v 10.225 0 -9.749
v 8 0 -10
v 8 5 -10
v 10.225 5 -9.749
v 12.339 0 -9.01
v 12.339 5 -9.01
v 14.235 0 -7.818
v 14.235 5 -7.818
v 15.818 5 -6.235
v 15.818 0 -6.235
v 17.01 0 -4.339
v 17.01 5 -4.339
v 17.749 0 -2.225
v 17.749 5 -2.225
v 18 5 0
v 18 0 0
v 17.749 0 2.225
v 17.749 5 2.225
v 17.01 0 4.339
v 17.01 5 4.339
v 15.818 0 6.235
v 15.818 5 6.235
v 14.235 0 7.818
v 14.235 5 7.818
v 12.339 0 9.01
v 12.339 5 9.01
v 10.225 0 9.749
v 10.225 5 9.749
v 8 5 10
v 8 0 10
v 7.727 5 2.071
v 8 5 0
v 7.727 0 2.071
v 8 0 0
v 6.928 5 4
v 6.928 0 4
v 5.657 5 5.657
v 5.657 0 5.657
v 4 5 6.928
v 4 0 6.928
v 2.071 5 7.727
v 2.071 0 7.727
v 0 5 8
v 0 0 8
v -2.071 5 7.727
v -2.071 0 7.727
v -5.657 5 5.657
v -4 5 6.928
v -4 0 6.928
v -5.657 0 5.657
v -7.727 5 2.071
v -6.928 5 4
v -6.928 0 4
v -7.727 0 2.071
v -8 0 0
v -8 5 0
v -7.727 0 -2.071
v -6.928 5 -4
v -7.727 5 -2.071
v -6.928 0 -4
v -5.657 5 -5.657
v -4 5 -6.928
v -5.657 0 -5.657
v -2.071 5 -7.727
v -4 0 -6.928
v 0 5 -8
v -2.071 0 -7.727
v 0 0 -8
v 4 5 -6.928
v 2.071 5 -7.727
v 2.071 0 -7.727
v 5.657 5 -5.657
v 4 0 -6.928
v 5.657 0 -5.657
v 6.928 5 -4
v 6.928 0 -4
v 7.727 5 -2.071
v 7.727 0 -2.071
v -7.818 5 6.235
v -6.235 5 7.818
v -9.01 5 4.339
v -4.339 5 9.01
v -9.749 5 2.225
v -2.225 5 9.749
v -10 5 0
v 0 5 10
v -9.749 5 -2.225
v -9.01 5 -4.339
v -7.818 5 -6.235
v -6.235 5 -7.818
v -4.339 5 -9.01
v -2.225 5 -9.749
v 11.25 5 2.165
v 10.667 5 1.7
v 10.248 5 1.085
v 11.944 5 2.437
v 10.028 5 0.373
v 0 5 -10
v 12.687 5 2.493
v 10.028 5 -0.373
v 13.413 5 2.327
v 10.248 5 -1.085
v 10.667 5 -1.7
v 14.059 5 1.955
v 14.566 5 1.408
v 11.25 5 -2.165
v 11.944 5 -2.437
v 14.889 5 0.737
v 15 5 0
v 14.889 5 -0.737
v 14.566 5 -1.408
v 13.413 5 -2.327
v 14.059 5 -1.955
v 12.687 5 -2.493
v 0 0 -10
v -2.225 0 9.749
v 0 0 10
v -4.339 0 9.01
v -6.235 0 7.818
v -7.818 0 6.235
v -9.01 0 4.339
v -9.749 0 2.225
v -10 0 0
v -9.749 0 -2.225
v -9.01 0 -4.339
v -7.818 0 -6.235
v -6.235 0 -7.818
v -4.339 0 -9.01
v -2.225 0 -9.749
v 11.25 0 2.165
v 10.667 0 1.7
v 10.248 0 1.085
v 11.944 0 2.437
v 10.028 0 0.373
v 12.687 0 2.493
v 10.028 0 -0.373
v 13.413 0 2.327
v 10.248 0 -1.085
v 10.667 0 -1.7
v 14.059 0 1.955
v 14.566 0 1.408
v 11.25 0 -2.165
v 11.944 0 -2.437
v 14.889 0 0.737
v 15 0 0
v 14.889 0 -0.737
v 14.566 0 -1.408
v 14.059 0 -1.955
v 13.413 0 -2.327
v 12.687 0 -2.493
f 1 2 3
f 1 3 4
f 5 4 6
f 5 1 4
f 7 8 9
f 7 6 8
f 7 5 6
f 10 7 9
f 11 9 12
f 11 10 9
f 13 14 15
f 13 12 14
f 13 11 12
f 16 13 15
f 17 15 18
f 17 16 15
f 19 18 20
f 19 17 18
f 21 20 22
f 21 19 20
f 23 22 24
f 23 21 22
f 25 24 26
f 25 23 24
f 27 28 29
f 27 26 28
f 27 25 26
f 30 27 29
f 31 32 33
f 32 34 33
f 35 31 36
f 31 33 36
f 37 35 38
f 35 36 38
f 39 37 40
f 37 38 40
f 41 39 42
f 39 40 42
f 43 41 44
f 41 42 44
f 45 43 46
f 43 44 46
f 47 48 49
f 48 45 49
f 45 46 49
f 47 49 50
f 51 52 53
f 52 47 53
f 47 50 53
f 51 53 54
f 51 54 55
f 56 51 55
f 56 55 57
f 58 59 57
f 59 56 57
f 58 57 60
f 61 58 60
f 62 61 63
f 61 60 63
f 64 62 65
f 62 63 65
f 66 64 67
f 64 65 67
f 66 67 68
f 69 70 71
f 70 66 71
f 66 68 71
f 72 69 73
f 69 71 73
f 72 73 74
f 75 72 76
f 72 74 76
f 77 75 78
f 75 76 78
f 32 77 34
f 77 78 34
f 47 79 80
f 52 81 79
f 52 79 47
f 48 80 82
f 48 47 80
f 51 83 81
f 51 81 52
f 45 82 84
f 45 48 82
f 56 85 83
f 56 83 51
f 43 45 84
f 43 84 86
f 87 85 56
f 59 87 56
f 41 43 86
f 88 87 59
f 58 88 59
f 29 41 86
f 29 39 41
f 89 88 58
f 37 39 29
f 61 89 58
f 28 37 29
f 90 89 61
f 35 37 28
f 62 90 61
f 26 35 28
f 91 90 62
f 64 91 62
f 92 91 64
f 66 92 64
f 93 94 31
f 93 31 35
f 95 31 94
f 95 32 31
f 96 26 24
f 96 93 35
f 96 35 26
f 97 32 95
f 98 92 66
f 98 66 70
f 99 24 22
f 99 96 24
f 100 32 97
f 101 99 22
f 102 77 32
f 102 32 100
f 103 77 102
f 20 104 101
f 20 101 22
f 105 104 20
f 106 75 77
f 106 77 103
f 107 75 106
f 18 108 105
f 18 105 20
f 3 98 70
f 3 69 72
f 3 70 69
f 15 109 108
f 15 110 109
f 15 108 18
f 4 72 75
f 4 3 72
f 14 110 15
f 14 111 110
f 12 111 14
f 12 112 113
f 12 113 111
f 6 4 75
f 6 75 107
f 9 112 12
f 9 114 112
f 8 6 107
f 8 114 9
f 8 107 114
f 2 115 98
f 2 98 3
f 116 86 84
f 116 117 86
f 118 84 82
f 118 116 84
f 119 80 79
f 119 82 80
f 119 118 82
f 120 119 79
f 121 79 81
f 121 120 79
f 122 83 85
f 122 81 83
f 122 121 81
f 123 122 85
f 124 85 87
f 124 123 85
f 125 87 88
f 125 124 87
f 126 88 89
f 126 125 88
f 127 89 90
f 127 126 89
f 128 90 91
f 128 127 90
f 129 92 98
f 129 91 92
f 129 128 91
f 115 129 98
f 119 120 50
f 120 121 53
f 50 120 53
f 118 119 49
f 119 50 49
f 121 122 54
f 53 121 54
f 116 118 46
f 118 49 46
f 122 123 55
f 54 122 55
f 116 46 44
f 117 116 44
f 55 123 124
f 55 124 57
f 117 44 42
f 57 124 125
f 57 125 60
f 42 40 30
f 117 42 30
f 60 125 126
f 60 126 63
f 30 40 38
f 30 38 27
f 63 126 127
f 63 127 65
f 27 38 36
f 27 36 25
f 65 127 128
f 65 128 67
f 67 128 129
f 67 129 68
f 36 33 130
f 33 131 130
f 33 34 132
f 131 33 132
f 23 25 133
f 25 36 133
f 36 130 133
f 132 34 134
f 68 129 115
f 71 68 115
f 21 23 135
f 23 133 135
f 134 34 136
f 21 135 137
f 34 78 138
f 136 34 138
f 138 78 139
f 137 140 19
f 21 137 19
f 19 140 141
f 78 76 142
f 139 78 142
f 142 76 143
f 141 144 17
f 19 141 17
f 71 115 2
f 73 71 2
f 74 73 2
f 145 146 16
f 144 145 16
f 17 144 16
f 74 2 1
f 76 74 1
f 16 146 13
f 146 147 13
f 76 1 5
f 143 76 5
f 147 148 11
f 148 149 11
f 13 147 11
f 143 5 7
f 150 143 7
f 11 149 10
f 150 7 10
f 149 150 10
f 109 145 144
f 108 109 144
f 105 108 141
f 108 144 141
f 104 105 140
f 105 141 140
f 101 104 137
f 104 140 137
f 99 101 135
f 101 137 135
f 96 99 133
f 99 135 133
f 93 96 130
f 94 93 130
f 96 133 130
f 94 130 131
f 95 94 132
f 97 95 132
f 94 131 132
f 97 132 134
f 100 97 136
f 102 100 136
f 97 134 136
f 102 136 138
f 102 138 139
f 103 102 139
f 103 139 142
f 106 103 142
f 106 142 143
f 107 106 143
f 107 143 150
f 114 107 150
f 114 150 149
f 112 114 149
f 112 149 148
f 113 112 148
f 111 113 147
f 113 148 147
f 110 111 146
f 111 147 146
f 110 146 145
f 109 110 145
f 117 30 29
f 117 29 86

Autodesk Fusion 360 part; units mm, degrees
sketch "Boceto1" plane through (0, 0, 0) normal (0, 1, 0) x (1, 0, 0)
  circle A0 centre (0, 0) radius 10
  circle A1 centre (0, 0) radius 2.5
  circle A2 centre (0, 0) radius 8
  line L0 (0, 0) -> (12.5, 0)
  circle A3 centre (12.5, 0) radius 2.5
  line L1 (12.5, -10) -> (0, -10)
  line L2 (0, 10) -> (12.5, 10)
  circle A4 centre (8, 0) radius 10
  dimension "d1" = 5
  dimension "d5" = 16
  dimension "d7" = 12.5
extrude "Extruir1" add sketch "Boceto1" along normal blind 5 contours A0 A2 A4 | A0 L2 A4 | A0 L1 A4 | A0 A4 | A0 A2 L0 A4 | A0 A2 L0 A4
ref_plane "PlanoDeObra1" through (-10, 2.3987, 0) normal (-1, 0, 0) x (0, 0, -1)
ref_plane "PlanoDeObra2" through (18, 2.3524, 0) normal (1, 0, 0) x (0, 0, 1)
sketch "Boceto2" plane through (0, 0, 0) normal (0, -1, 0) x (1, 0, 0)
  circle A0 centre (0, 0) radius 8
  circle A1 centre (12.5, 0) radius 2.5
  arc A2 (0, 10) -> (0, -10) centre (0, 0) ccw
  line L0 (0, -10) -> (8, -10)
  arc A3 (8, -10) -> (8, 10) centre (8, 0) ccw
  line L1 (8, 10) -> (0, 10)
  circle A4 centre (12.5, 0) radius 2.5
  dimension "d11" = 5
